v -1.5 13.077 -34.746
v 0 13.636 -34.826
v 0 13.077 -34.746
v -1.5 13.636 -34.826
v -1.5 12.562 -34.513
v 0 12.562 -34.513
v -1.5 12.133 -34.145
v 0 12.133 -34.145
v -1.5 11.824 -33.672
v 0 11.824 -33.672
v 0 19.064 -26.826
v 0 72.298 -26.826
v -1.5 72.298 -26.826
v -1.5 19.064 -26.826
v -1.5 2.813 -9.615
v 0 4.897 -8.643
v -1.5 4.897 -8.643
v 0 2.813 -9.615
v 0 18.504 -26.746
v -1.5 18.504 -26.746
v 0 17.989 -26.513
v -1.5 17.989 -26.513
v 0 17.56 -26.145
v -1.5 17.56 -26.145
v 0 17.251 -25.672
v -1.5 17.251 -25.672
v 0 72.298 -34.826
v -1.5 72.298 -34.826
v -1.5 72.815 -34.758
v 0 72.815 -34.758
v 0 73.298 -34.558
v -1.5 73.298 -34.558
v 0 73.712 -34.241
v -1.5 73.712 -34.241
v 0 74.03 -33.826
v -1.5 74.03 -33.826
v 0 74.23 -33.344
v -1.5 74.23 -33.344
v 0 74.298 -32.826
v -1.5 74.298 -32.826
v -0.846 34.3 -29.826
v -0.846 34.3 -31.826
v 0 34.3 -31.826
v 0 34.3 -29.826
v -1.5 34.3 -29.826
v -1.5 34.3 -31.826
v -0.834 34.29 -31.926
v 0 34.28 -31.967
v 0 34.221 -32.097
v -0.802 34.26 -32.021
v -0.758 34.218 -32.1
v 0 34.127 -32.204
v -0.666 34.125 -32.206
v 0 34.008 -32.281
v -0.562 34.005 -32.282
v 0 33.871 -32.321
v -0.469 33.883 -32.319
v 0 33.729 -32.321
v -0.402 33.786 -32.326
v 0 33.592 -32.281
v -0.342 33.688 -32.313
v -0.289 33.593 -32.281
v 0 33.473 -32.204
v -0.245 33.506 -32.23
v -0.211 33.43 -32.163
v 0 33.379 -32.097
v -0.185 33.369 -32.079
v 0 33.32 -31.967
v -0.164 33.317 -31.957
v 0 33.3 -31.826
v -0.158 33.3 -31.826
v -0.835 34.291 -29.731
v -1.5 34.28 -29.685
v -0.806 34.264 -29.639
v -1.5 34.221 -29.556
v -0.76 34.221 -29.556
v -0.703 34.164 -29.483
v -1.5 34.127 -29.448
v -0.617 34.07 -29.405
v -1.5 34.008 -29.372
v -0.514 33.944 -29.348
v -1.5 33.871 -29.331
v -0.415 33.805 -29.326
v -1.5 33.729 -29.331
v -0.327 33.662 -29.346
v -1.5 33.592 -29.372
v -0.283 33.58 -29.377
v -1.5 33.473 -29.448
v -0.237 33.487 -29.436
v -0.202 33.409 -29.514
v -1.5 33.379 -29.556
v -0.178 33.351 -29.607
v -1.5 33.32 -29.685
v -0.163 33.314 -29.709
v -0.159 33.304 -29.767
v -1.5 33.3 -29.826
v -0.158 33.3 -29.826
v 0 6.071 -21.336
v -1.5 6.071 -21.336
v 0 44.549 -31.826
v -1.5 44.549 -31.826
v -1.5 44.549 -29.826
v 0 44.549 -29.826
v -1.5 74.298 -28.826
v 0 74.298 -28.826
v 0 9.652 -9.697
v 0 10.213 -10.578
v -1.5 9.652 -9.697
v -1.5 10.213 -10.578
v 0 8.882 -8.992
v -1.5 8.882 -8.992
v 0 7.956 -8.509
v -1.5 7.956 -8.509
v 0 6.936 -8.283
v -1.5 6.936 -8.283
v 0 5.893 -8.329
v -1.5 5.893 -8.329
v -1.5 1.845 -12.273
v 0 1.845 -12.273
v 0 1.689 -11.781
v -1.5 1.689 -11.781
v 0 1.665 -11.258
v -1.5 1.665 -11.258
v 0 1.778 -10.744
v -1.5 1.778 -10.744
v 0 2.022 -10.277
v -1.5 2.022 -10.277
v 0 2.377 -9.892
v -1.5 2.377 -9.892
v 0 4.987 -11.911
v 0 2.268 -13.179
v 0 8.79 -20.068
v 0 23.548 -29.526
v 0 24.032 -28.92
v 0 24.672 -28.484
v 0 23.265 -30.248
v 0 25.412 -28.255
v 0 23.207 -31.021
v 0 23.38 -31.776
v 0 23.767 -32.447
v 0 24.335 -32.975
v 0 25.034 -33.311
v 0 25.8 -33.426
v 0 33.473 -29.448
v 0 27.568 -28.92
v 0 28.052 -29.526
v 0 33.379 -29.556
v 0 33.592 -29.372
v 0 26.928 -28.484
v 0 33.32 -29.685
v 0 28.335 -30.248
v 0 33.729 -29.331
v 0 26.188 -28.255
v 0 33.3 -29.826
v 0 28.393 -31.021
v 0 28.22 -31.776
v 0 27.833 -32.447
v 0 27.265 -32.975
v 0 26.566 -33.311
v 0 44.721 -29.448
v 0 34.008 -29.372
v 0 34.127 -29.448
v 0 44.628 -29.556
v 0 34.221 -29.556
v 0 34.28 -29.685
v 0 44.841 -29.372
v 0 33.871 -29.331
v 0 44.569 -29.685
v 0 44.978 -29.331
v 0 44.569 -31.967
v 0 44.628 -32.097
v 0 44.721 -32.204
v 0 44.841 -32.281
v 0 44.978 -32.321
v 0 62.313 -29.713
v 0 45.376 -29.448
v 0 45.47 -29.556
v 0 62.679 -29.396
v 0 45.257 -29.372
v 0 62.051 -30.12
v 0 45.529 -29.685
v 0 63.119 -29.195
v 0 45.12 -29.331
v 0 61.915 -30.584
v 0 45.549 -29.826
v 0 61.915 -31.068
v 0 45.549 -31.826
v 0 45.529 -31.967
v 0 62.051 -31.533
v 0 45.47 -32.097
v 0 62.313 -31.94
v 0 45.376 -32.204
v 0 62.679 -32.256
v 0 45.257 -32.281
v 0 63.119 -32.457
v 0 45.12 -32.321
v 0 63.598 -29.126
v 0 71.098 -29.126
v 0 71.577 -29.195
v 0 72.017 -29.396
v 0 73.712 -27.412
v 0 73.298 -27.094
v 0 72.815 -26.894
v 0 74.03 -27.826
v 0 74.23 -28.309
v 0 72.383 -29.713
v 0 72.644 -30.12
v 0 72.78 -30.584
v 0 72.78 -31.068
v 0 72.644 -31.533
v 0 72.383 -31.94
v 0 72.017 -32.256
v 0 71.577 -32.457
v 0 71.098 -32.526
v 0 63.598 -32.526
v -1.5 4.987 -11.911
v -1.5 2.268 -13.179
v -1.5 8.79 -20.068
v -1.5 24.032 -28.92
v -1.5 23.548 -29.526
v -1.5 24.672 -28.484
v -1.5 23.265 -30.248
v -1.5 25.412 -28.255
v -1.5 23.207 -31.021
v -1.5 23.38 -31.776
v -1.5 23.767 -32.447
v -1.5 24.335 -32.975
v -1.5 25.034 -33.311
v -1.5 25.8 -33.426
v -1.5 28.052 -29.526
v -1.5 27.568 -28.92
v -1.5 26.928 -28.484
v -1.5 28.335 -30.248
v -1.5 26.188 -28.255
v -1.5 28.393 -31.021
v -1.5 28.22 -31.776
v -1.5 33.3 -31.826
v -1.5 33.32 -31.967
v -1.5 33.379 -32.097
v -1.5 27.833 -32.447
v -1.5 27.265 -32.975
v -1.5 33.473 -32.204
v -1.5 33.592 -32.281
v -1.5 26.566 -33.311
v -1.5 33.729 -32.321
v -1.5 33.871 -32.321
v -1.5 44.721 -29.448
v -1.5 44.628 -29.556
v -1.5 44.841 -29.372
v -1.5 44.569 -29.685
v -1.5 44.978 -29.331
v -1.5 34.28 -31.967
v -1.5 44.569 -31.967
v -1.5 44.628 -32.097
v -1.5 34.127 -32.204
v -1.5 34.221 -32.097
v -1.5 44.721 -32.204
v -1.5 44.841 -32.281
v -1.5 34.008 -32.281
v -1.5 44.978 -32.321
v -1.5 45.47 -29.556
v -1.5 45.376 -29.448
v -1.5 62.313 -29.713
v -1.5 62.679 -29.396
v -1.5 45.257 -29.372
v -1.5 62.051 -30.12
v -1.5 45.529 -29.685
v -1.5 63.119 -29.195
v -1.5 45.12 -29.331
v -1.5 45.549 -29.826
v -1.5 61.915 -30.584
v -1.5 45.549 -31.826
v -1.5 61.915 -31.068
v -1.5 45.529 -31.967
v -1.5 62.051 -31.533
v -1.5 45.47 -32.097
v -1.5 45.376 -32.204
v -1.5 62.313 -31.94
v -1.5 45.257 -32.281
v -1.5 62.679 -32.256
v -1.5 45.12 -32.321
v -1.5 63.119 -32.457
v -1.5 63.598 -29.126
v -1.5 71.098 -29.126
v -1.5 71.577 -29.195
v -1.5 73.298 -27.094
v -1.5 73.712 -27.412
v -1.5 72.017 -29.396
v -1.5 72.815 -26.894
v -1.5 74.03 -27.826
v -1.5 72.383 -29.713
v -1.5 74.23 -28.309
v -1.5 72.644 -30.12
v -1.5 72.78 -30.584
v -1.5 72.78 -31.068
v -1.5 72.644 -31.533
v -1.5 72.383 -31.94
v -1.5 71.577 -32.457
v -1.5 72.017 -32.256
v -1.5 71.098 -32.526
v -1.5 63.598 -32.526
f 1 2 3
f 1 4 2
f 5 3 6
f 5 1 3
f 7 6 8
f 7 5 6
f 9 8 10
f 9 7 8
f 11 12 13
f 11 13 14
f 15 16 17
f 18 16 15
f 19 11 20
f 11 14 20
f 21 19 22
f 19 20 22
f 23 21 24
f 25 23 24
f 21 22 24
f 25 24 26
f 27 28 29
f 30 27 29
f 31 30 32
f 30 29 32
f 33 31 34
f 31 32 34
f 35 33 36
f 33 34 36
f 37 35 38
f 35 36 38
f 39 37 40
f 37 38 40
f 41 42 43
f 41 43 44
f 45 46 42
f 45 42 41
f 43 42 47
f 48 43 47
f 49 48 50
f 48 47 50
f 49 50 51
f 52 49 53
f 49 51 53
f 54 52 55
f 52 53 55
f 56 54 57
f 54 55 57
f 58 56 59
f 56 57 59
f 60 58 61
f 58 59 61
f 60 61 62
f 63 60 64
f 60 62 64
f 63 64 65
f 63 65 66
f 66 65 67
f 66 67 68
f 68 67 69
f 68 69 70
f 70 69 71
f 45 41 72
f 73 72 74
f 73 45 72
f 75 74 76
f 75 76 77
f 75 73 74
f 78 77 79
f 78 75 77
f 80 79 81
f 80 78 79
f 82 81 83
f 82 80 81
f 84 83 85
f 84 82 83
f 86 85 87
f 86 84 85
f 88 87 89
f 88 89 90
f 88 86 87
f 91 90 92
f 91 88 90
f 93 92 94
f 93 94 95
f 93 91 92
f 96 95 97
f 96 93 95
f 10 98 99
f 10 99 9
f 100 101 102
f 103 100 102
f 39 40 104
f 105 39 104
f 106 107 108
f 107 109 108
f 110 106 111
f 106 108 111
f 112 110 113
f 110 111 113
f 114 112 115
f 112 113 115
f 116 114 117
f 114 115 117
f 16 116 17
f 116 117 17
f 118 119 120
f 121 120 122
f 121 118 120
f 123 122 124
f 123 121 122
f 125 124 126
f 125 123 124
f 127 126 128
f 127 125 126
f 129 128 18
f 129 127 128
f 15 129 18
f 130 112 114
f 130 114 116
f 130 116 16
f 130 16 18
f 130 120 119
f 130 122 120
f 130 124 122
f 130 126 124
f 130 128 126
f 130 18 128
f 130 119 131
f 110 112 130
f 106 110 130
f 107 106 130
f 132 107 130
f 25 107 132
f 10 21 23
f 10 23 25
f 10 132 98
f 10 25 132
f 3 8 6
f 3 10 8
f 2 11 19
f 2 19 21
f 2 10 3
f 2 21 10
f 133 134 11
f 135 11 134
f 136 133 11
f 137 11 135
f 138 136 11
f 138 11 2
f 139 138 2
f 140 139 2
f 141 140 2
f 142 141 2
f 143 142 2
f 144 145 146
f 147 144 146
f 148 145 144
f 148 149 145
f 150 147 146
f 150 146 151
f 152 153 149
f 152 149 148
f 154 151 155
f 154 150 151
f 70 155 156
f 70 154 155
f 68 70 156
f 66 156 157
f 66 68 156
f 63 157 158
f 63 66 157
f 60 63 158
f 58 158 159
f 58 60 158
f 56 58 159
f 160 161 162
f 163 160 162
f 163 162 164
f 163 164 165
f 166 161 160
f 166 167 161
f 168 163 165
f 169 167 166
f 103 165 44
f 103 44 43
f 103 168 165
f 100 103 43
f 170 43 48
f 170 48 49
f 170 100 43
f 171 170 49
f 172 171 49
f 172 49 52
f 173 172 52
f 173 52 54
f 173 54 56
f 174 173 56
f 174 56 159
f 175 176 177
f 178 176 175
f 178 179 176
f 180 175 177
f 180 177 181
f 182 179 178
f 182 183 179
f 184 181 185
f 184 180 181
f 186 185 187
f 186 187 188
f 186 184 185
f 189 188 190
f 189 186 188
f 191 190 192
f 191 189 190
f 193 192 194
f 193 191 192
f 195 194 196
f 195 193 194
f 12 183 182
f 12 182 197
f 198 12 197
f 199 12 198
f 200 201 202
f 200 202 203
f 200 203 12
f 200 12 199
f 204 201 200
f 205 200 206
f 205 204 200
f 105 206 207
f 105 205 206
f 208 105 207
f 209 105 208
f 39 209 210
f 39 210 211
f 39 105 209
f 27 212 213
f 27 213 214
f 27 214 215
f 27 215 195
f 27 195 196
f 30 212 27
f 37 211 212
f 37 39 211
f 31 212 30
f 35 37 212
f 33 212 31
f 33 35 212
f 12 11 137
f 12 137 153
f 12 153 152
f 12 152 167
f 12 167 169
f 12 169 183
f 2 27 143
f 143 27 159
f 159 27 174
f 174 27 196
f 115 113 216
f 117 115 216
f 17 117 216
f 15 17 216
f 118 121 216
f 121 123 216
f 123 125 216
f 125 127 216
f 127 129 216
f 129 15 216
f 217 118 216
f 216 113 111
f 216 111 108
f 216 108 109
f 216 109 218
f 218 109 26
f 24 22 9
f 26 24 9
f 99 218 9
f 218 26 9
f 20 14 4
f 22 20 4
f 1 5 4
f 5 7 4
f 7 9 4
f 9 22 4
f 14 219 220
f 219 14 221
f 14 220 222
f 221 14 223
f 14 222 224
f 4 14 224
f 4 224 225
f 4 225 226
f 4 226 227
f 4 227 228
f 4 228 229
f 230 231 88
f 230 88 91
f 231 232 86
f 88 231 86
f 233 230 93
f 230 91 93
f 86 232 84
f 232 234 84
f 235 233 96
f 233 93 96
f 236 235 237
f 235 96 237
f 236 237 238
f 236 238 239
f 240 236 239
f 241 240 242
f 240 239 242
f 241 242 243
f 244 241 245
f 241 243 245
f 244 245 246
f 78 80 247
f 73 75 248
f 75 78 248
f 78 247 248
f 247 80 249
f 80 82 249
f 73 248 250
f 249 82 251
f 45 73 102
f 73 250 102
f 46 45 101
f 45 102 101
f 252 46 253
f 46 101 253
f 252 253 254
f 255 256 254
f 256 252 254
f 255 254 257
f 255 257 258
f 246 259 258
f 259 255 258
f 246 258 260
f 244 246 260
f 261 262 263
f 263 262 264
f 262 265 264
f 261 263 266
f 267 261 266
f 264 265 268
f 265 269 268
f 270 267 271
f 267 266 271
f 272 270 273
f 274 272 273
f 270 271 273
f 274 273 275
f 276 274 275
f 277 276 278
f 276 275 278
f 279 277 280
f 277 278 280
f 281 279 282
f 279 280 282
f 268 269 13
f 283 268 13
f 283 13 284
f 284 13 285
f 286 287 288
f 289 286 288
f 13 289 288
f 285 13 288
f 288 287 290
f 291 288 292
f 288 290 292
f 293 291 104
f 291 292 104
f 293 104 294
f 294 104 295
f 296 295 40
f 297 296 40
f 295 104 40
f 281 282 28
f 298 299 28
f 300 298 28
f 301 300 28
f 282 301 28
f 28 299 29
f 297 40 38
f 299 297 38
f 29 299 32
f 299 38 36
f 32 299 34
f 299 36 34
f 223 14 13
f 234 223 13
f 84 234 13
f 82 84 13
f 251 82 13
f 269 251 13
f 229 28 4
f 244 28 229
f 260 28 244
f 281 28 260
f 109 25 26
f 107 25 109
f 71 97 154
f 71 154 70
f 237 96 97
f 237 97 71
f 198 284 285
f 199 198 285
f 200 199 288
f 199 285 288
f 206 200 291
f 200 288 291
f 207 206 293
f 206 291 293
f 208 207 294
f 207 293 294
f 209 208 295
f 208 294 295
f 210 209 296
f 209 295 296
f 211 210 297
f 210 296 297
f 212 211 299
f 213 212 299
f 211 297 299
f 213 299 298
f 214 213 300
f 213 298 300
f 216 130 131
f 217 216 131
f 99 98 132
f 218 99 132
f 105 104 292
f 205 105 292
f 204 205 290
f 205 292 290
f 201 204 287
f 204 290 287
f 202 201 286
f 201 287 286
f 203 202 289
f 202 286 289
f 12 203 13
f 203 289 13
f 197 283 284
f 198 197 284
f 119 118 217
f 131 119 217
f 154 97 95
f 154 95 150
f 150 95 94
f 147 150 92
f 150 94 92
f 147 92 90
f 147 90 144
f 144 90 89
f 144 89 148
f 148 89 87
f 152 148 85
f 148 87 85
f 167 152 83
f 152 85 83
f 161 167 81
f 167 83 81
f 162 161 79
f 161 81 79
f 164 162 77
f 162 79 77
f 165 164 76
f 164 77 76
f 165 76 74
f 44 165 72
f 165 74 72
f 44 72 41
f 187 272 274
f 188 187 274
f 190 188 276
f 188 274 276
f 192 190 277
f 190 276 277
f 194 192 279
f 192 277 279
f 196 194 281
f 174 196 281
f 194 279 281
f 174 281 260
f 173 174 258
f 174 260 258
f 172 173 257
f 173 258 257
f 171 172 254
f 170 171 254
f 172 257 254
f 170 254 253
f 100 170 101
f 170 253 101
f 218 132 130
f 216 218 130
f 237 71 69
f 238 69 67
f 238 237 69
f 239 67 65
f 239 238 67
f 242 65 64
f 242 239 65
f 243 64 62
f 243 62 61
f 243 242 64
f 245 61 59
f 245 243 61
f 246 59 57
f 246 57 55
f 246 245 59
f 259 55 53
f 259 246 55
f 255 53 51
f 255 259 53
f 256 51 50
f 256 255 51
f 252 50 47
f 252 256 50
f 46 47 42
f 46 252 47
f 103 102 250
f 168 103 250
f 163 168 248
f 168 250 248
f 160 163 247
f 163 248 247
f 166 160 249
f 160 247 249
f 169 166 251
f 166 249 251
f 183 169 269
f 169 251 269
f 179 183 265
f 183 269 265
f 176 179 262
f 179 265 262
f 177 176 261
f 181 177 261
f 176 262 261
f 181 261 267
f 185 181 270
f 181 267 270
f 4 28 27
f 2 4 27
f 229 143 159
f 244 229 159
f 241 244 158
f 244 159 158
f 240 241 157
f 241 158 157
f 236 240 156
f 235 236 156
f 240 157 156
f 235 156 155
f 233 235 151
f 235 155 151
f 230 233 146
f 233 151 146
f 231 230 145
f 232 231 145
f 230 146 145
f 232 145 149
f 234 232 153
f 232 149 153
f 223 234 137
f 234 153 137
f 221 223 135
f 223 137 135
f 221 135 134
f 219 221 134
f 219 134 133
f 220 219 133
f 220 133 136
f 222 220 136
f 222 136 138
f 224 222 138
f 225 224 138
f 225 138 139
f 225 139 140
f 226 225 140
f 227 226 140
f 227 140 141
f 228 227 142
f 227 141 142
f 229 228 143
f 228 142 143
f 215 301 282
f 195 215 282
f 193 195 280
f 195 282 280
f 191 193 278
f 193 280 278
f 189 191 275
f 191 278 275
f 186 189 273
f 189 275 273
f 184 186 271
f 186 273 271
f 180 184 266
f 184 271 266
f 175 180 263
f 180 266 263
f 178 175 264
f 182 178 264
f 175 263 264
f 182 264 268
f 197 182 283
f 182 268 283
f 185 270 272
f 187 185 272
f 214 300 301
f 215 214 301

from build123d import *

# Parameters (mm, degrees)
SKETCH1_R            = 2.6
BASE_FLANGE1_DEPTH   = 1.5
KEYING_DEPTH         = 10
FILLET1_R            = 2
FILLET2_R            = 4
JOG1_START           = -34.826317149
JOG1_DEPTH           = 8
JOG1_START_2         = -32.826317149
JOG1_2_DEPTH         = 0.3
JOG1_START_3         = -29.126317149
JOG1_3_DEPTH         = 0.3
JOG1_4_DEPTH         = 8
JOG1_START_4         = -13.5
JOG1_5_DEPTH         = 1.5
CUT_EXTRUDE1_START   = -13.5
CUT_EXTRUDE1_DEPTH   = 12
CUT_EXTRUDE1_START_2 = -1.5
CUT_EXTRUDE1_2_DEPTH = 1.5
CUT_EXTRUDE1_3_DEPTH = 1.5


with BuildPart() as part:
    # Base-Flange1: sheet metal written as solids
    # Sketch1 → Base-Flange1 (new body)
    with BuildSketch(Plane(origin=(0, 0, 0), x_dir=(0, 0, -1), z_dir=(1, 0, 0))):
        Polygon((34.826317149, 21.8), (34.826317149, 63.8), (26.826317149, 63.8), (26.826317149, 17.789661718), (6.95251297, 8.522354632), (9.826317149, 2.359461681), (10.460244542, 1), (34.826317149, 12.362086256), align=None)
        with Locations((30.826317149, 25.8)):
            Circle(SKETCH1_R, mode=Mode.SUBTRACT)
        with BuildLine():
            Line((32.526317149, 60.6), (32.526317149, 53.1))
            ThreePointArc((32.526317149, 53.1), (30.826317149, 51.4), (29.126317149, 53.1))
            Line((29.126317149, 53.1), (29.126317149, 60.6))
            ThreePointArc((29.126317149, 60.6), (30.826317149, 62.3), (32.526317149, 60.6))
        make_face(mode=Mode.SUBTRACT)
    extrude(amount=-BASE_FLANGE1_DEPTH)

    # Sketch6 → Keying (cut)
    with BuildSketch(Plane(origin=(0, 0, 0), x_dir=(0, 0, -1), z_dir=(1, 0, 0))):
        Polygon((21.335937987, 6.071419141), (20.068083201, 8.790342502), (11.911313118, 4.986778146), (13.179167903, 2.267854785), (16.260435533, 3.704673478), align=None)
    extrude(amount=-KEYING_DEPTH, mode=Mode.SUBTRACT)

    # Fillet1
    fillet1_edges = [part.edges().sort_by_distance(p)[0] for p in [
        (-0.75, 12.362086256, -34.826317149),
        (-0.75, 1, -10.460244542),
        (-0.75, 17.789661718, -26.826317149),
        (-0.75, 63.8, -26.826317149),
        (-0.75, 63.8, -34.826317149),
    ]]
    fillet(fillet1_edges, radius=FILLET1_R)

    # Fillet2
    fillet2_edges = [part.edges().sort_by_distance(p)[0] for p in [
        (-0.75, 8.522354632, -6.95251297),
    ]]
    fillet(fillet2_edges, radius=FILLET2_R)

    # Jog1: read off the stored shape, not the designer's step
    # Jog1 outline → Jog1 (cut)
    with BuildSketch(Plane.XY.offset(JOG1_START)):
        with BuildLine():
            Line((-1.5, 63.8), (-1.5, 34.716841062))
            ThreePointArc((-1.5, 34.716841062), (-0.408349934, 33.794859608), (0, 32.425553214))
            Line((0, 32.425553214), (0, 63.8))
            Line((0, 63.8), (-1.5, 63.8))
        make_face()
    extrude(amount=JOG1_DEPTH, mode=Mode.SUBTRACT)

    # Jog1 2 outline → Jog1 2 (add)
    with BuildSketch(Plane.XY.offset(JOG1_START_2)):
        with BuildLine():
            ThreePointArc((-1.5, 34.716841062), (-1.989225891, 34.872818996), (-2.5, 34.925553214))
            Line((-2.5, 34.925553214), (-11, 34.925553214))
            ThreePointArc((-11, 34.925553214), (-11.707106781, 35.218446433), (-12, 35.925553214))
            Line((-12, 35.925553214), (-12, 63.8))
            Line((-12, 63.8), (-13.5, 63.8))
            Line((-13.5, 63.8), (-13.5, 35.925553214))
            ThreePointArc((-13.5, 35.925553214), (-12.767766953, 34.157786261), (-11, 33.425553214))
            Line((-11, 33.425553214), (-2.5, 33.425553214))
            ThreePointArc((-2.5, 33.425553214), (-1.792893219, 33.132659995), (-1.5, 32.425553214))
            Line((-1.5, 32.425553214), (-1.5, 34.716841062))
        make_face()
    extrude(amount=JOG1_2_DEPTH)

    # Jog1 3 outline → Jog1 3 (add)
    with BuildSketch(Plane.XY.offset(JOG1_START_3)):
        with BuildLine():
            ThreePointArc((-1.5, 34.716841062), (-1.989225891, 34.872818996), (-2.5, 34.925553214))
            Line((-2.5, 34.925553214), (-11, 34.925553214))
            ThreePointArc((-11, 34.925553214), (-11.707106781, 35.218446433), (-12, 35.925553214))
            Line((-12, 35.925553214), (-12, 63.8))
            Line((-12, 63.8), (-13.5, 63.8))
            Line((-13.5, 63.8), (-13.5, 35.925553214))
            ThreePointArc((-13.5, 35.925553214), (-12.767766953, 34.157786261), (-11, 33.425553214))
            Line((-11, 33.425553214), (-2.5, 33.425553214))
            ThreePointArc((-2.5, 33.425553214), (-1.792893219, 33.132659995), (-1.5, 32.425553214))
            Line((-1.5, 32.425553214), (-1.5, 34.716841062))
        make_face()
    extrude(amount=JOG1_3_DEPTH)

    # Jog1 4 outline → Jog1 4 (add)
    with BuildSketch(Plane.XY.offset(JOG1_START)):
        with BuildLine():
            ThreePointArc((-1.5, 34.716841062), (-1.989225891, 34.872818996), (-2.5, 34.925553214))
            Line((-2.5, 34.925553214), (-11, 34.925553214))
            ThreePointArc((-11, 34.925553214), (-11.707106781, 35.218446433), (-12, 35.925553214))
            Line((-12, 35.925553214), (-12, 63.8))
            Line((-12, 63.8), (-13.5, 63.8))
            Line((-13.5, 63.8), (-13.5, 35.925553214))
            ThreePointArc((-13.5, 35.925553214), (-12.767766953, 34.157786261), (-11, 33.425553214))
            Line((-11, 33.425553214), (-2.5, 33.425553214))
            ThreePointArc((-2.5, 33.425553214), (-1.792893219, 33.132659995), (-1.5, 32.425553214))
            Line((-1.5, 32.425553214), (-1.5, 34.716841062))
        make_face()
    extrude(amount=JOG1_4_DEPTH)

    # Jog1 5 outline → Jog1 5 (cut)
    with BuildSketch(Plane.YZ.offset(JOG1_START_4)):
        with BuildLine():
            ThreePointArc((61.8, -26.826317149), (63.214213562, -27.412103587), (63.8, -28.826317149))
            Line((63.8, -28.826317149), (63.8, -26.826317149))
            Line((63.8, -26.826317149), (61.8, -26.826317149))
        make_face()
        with BuildLine():
            ThreePointArc((63.8, -32.826317149), (63.214213562, -34.240530711), (61.8, -34.826317149))
            Line((61.8, -34.826317149), (63.8, -34.826317149))
            Line((63.8, -34.826317149), (63.8, -32.826317149))
        make_face()
        with BuildLine():
            Line((60.6, -29.126317149), (53.1, -29.126317149))
            ThreePointArc((53.1, -29.126317149), (51.4, -30.826317149), (53.1, -32.526317149))
            Line((53.1, -32.526317149), (60.6, -32.526317149))
            ThreePointArc((60.6, -32.526317149), (62.3, -30.826317149), (60.6, -29.126317149))
        make_face()
    extrude(amount=JOG1_5_DEPTH, mode=Mode.SUBTRACT)

    # Cut-Extrude1: read off the stored shape, not the designer's step
    # Cut-Extrude1 outline → Cut-Extrude1 (cut)
    with BuildSketch(Plane(origin=(0, 0, 0), x_dir=(0, 0, -1), z_dir=(1, 0, 0)).offset(CUT_EXTRUDE1_START)):
        with BuildLine():
            Line((26.826317149, 31), (34.826317149, 31))
            Line((34.826317149, 31), (34.826317149, 61.8))
            ThreePointArc((34.826317149, 61.8), (34.240530711, 63.214213562), (32.826317149, 63.8))
            Line((32.826317149, 63.8), (28.826317149, 63.8))
            ThreePointArc((28.826317149, 63.8), (27.412103587, 63.214213562), (26.826317149, 61.8))
            Line((26.826317149, 61.8), (26.826317149, 31))
        make_face()
        with BuildLine():
            ThreePointArc((29.126317149, 60.6), (30.826317149, 62.3), (32.526317149, 60.6))
            Line((32.526317149, 60.6), (32.526317149, 53.1))
            ThreePointArc((32.526317149, 53.1), (30.826317149, 51.4), (29.126317149, 53.1))
            Line((29.126317149, 53.1), (29.126317149, 60.6))
        make_face(mode=Mode.SUBTRACT)
    extrude(amount=CUT_EXTRUDE1_DEPTH, mode=Mode.SUBTRACT)

    # Cut-Extrude1 2 outline → Cut-Extrude1 2 (cut)
    with BuildSketch(Plane(origin=(0, 0, 0), x_dir=(0, 0, -1), z_dir=(1, 0, 0)).offset(CUT_EXTRUDE1_START_2)):
        with BuildLine():
            ThreePointArc((29.826317149, 34.3), (29.326317149, 33.8), (29.826317149, 33.3))
            Line((29.826317149, 33.3), (31.826317149, 33.3))
            ThreePointArc((31.826317149, 33.3), (32.326317149, 33.8), (31.826317149, 34.3))
            Line((31.826317149, 34.3), (29.826317149, 34.3))
        make_face()
    extrude(amount=CUT_EXTRUDE1_2_DEPTH, mode=Mode.SUBTRACT)

    # Cut-Extrude1 3 outline → Cut-Extrude1 3 (add)
    with BuildSketch(Plane(origin=(0, 0, 0), x_dir=(0, 0, -1), z_dir=(1, 0, 0)).offset(CUT_EXTRUDE1_START_2)):
        with BuildLine():
            Line((26.826317149, 31), (34.826317149, 31))
            Line((34.826317149, 31), (34.826317149, 72.297787144))
            ThreePointArc((34.826317149, 72.297787144), (34.240530711, 73.712000706), (32.826317149, 74.297787144))
            Line((32.826317149, 74.297787144), (28.826317149, 74.297787144))
            ThreePointArc((28.826317149, 74.297787144), (27.412103587, 73.712000706), (26.826317149, 72.297787144))
            Line((26.826317149, 72.297787144), (26.826317149, 31))
        make_face()
        with BuildLine():
            ThreePointArc((29.826317149, 33.3), (29.326317149, 33.8), (29.826317149, 34.3))
            Line((29.826317149, 34.3), (31.826317149, 34.3))
            ThreePointArc((31.826317149, 34.3), (32.326317149, 33.8), (31.826317149, 33.3))
            Line((31.826317149, 33.3), (29.826317149, 33.3))
        make_face(mode=Mode.SUBTRACT)
        with BuildLine():
            Line((29.826317149, 45.548893572), (31.826317149, 45.548893572))
            ThreePointArc((31.826317149, 45.548893572), (32.326317149, 45.048893572), (31.826317149, 44.548893572))
            Line((31.826317149, 44.548893572), (29.826317149, 44.548893572))
            ThreePointArc((29.826317149, 44.548893572), (29.326317149, 45.048893572), (29.826317149, 45.548893572))
        make_face(mode=Mode.SUBTRACT)
        with BuildLine():
            Line((29.126317149, 63.597787144), (29.126317149, 71.097787144))
            ThreePointArc((29.126317149, 71.097787144), (30.826317149, 72.797787144), (32.526317149, 71.097787144))
            Line((32.526317149, 71.097787144), (32.526317149, 63.597787144))
            ThreePointArc((32.526317149, 63.597787144), (30.826317149, 61.897787144), (29.126317149, 63.597787144))
        make_face(mode=Mode.SUBTRACT)
    extrude(amount=CUT_EXTRUDE1_3_DEPTH)


solid = part.part
